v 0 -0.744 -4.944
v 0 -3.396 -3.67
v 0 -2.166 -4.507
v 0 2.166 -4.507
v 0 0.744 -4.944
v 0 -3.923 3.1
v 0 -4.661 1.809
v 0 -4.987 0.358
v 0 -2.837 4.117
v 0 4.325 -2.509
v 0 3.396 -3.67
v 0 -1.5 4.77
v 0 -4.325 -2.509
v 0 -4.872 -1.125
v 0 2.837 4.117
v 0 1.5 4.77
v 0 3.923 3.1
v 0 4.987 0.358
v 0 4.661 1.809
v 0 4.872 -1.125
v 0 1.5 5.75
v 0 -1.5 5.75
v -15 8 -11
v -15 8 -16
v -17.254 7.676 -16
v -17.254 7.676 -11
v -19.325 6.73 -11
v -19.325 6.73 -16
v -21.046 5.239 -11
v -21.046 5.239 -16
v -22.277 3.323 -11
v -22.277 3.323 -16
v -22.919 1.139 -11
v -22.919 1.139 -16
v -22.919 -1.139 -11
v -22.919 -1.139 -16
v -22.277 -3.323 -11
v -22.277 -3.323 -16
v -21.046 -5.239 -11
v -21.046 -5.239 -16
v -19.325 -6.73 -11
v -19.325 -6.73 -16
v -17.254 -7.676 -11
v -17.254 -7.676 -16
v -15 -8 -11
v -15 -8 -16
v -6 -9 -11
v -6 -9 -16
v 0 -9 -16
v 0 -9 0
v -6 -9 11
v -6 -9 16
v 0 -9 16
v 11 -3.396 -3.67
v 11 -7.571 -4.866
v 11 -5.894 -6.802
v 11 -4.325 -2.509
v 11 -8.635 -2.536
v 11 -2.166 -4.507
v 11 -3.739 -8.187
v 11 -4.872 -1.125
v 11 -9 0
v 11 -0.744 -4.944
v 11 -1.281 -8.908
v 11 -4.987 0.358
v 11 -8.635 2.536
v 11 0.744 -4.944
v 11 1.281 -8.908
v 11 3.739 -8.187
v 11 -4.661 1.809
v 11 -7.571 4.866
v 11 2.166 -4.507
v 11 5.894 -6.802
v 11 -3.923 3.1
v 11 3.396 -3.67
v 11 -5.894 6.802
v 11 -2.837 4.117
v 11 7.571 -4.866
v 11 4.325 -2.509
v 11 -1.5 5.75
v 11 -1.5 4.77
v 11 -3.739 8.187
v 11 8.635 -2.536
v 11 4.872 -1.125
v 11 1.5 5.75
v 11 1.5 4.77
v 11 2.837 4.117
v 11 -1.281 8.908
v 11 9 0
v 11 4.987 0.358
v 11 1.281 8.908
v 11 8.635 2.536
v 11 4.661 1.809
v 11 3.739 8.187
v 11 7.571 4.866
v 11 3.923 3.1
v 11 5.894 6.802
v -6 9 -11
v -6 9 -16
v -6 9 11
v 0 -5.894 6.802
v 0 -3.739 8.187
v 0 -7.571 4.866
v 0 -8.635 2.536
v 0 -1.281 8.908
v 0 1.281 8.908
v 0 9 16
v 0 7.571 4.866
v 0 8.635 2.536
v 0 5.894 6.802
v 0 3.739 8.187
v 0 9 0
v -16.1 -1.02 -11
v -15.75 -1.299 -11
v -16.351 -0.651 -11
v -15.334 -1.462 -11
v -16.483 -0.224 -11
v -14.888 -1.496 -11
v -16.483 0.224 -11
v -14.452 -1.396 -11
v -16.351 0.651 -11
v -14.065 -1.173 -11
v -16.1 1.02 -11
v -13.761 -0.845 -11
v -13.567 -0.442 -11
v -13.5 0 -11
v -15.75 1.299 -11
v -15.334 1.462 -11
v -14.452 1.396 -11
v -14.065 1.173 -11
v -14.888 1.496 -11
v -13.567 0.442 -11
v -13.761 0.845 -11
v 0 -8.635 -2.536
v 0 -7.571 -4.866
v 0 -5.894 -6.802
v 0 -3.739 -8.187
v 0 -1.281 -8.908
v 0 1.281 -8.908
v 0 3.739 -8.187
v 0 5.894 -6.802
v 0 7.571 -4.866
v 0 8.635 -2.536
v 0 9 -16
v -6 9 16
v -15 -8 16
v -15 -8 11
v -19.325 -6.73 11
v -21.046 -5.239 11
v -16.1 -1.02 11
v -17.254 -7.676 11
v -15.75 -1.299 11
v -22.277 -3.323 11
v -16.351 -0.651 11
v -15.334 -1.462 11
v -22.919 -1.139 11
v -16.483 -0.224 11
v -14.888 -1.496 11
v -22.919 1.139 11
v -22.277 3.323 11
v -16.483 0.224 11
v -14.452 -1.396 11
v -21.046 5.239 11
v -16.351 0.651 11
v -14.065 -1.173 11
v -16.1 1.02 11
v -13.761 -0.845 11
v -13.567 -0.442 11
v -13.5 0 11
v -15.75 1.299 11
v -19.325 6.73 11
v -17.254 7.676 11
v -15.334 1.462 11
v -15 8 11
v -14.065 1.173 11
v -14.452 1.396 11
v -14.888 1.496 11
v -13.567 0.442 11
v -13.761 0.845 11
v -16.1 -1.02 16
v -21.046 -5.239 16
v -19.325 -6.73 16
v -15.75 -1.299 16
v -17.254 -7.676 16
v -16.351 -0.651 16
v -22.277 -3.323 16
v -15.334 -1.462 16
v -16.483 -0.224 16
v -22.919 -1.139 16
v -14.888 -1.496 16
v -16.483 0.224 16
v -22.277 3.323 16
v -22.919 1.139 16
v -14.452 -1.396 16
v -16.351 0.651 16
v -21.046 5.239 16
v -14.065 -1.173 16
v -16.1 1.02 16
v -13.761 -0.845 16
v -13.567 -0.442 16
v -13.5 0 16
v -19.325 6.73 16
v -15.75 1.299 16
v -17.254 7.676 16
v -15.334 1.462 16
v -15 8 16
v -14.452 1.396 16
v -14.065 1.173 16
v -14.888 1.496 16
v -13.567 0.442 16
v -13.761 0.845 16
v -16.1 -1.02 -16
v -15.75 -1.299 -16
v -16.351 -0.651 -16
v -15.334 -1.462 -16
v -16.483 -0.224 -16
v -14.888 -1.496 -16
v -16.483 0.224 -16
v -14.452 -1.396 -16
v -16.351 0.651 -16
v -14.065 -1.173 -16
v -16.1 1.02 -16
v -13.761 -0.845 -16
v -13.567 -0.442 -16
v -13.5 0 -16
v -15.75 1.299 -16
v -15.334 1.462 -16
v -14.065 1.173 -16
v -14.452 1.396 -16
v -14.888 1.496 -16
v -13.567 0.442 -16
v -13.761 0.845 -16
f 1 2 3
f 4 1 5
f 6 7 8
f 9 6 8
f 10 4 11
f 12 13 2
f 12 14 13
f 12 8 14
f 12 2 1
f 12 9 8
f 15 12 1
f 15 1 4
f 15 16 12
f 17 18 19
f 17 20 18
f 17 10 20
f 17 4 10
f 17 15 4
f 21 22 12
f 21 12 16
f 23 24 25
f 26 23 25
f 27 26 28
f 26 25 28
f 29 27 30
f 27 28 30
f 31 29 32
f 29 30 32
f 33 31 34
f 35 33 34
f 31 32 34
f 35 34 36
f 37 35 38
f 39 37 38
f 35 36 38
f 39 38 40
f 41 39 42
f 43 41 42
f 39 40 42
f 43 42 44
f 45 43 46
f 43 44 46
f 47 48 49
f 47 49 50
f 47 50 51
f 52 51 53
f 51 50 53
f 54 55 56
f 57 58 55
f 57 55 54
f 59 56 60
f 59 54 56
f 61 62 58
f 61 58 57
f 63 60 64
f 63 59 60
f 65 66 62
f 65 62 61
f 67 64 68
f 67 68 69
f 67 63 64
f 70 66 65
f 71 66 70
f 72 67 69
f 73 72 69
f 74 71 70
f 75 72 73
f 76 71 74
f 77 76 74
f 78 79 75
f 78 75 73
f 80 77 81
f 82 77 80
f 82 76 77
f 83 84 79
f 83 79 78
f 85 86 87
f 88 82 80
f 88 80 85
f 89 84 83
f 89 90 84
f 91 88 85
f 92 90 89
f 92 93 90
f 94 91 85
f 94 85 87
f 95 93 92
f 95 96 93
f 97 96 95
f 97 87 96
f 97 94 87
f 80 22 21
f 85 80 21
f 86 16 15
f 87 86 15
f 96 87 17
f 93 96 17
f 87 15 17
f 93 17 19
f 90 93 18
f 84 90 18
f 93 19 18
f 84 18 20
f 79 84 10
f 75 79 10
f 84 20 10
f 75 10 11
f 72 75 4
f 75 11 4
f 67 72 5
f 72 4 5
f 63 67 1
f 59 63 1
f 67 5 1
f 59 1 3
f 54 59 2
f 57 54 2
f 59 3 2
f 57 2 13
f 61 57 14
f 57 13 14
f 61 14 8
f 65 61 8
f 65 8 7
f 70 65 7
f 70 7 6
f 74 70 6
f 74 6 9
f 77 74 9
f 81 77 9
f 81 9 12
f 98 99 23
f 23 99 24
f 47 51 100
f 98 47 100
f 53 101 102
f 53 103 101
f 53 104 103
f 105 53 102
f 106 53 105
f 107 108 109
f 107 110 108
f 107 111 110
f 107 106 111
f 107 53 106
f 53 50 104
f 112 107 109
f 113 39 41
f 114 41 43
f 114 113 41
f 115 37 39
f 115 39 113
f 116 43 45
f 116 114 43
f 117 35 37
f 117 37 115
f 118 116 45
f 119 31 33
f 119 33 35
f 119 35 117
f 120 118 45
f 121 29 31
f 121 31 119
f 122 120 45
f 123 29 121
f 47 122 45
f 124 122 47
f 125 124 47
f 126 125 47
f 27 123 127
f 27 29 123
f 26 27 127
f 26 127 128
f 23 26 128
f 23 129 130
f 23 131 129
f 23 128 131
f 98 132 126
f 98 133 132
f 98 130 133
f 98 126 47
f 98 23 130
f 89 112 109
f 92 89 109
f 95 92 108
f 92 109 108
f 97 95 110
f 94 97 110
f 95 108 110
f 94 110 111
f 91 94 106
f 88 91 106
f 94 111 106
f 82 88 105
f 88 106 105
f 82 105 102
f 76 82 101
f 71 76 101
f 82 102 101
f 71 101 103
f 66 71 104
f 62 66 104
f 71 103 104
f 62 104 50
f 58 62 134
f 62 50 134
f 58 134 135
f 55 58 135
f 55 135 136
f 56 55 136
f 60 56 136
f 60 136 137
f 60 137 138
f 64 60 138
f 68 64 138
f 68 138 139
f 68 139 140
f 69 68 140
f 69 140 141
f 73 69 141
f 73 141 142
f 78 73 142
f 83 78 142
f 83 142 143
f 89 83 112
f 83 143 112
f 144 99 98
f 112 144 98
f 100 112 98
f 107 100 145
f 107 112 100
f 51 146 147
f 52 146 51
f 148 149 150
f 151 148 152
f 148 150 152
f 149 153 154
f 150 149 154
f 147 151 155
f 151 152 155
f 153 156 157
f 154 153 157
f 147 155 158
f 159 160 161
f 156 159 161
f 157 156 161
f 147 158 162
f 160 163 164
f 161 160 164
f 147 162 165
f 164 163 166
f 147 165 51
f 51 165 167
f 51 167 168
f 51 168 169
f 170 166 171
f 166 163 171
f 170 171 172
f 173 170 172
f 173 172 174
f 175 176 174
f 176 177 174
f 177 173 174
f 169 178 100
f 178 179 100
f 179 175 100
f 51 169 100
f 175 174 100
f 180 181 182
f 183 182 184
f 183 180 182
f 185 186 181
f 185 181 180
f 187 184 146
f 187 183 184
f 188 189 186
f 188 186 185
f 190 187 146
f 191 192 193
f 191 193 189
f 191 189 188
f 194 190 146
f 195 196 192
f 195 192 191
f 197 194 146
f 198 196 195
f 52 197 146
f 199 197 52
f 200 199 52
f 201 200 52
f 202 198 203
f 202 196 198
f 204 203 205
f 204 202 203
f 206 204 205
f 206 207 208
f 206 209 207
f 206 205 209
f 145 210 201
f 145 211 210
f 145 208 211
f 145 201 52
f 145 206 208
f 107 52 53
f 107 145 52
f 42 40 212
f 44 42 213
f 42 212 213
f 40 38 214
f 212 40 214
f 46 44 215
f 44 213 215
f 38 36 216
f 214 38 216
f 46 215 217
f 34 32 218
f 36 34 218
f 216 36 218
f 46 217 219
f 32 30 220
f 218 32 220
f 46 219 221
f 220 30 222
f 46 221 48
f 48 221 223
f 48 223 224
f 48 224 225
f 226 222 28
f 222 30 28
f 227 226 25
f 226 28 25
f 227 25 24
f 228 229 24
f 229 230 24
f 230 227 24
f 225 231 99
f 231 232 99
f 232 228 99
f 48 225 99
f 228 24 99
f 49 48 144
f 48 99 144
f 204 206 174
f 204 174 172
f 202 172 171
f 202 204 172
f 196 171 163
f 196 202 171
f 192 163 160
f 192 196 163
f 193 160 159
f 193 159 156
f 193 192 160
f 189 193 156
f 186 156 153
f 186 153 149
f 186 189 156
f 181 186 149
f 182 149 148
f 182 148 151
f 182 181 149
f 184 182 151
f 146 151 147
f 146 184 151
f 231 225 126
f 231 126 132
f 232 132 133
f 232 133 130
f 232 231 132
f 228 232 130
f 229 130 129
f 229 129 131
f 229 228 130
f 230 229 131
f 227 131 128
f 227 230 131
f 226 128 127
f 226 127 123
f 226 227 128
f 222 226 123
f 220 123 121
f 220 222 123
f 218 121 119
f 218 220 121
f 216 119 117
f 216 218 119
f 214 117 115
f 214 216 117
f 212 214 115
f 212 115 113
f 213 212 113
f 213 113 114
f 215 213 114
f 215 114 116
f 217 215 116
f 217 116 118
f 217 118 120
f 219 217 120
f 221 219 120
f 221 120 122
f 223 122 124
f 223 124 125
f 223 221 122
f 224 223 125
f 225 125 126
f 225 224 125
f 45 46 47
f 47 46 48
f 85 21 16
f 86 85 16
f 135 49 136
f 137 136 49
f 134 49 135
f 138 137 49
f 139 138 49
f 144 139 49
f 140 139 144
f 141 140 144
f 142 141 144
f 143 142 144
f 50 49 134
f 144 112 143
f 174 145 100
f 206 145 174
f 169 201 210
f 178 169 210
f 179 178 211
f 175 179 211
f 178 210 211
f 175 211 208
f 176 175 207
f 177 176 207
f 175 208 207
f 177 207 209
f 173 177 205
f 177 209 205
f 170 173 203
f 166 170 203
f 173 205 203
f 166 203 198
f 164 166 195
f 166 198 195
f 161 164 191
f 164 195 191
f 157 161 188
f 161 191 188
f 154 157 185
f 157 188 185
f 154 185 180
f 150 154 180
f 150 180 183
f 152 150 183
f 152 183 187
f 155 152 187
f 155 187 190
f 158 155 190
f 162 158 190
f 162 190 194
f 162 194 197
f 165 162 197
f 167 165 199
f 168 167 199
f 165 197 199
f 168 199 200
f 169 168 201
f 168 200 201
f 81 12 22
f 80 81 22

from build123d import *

# Parameters (mm, degrees)
F0_W     = 18
F0_H     = 32
F1_DEPTH = 6
F2_R     = 1.5
F3_DEPTH = 5
F5_R     = 9
F6_DEPTH = 11


with BuildPart() as f1:
    # F0 (on Right) → F1 (new body)
    with BuildSketch(Plane.YZ):
        Rectangle(F0_W, F0_H)
    extrude(amount=-F1_DEPTH)

    # F2 (on face) → F3 (join)
    with BuildSketch(Plane.XY.offset(16)):
        with BuildLine():
            Line((-6, 9), (-15, 8))
            ThreePointArc((-15, 8), (-23, 0), (-15, -8))
            Line((-15, -8), (-6, -9))
            Line((-6, -9), (-6, 9))
        make_face()
        with Locations((-15, 0)):
            Circle(F2_R, mode=Mode.SUBTRACT)
    extrude(amount=-F3_DEPTH)

    # F4: F1 across plane


with BuildPart() as f1_1:
    add(f1.part)
    add(f1.part.mirror(Plane.XY))

    # F5 (on face) → F6 (join)
    with BuildSketch(Plane.YZ):
        Circle(F5_R)
        with BuildLine():
            ThreePointArc((1.5, 4.769696), (0, -5), (-1.5, 4.769696))
            Line((-1.5, 4.769696), (-1.5, 5.75))
            Line((-1.5, 5.75), (1.5, 5.75))
            Line((1.5, 5.75), (1.5, 4.769696))
        make_face(mode=Mode.SUBTRACT)
    extrude(amount=F6_DEPTH)


solid = f1_1.part
